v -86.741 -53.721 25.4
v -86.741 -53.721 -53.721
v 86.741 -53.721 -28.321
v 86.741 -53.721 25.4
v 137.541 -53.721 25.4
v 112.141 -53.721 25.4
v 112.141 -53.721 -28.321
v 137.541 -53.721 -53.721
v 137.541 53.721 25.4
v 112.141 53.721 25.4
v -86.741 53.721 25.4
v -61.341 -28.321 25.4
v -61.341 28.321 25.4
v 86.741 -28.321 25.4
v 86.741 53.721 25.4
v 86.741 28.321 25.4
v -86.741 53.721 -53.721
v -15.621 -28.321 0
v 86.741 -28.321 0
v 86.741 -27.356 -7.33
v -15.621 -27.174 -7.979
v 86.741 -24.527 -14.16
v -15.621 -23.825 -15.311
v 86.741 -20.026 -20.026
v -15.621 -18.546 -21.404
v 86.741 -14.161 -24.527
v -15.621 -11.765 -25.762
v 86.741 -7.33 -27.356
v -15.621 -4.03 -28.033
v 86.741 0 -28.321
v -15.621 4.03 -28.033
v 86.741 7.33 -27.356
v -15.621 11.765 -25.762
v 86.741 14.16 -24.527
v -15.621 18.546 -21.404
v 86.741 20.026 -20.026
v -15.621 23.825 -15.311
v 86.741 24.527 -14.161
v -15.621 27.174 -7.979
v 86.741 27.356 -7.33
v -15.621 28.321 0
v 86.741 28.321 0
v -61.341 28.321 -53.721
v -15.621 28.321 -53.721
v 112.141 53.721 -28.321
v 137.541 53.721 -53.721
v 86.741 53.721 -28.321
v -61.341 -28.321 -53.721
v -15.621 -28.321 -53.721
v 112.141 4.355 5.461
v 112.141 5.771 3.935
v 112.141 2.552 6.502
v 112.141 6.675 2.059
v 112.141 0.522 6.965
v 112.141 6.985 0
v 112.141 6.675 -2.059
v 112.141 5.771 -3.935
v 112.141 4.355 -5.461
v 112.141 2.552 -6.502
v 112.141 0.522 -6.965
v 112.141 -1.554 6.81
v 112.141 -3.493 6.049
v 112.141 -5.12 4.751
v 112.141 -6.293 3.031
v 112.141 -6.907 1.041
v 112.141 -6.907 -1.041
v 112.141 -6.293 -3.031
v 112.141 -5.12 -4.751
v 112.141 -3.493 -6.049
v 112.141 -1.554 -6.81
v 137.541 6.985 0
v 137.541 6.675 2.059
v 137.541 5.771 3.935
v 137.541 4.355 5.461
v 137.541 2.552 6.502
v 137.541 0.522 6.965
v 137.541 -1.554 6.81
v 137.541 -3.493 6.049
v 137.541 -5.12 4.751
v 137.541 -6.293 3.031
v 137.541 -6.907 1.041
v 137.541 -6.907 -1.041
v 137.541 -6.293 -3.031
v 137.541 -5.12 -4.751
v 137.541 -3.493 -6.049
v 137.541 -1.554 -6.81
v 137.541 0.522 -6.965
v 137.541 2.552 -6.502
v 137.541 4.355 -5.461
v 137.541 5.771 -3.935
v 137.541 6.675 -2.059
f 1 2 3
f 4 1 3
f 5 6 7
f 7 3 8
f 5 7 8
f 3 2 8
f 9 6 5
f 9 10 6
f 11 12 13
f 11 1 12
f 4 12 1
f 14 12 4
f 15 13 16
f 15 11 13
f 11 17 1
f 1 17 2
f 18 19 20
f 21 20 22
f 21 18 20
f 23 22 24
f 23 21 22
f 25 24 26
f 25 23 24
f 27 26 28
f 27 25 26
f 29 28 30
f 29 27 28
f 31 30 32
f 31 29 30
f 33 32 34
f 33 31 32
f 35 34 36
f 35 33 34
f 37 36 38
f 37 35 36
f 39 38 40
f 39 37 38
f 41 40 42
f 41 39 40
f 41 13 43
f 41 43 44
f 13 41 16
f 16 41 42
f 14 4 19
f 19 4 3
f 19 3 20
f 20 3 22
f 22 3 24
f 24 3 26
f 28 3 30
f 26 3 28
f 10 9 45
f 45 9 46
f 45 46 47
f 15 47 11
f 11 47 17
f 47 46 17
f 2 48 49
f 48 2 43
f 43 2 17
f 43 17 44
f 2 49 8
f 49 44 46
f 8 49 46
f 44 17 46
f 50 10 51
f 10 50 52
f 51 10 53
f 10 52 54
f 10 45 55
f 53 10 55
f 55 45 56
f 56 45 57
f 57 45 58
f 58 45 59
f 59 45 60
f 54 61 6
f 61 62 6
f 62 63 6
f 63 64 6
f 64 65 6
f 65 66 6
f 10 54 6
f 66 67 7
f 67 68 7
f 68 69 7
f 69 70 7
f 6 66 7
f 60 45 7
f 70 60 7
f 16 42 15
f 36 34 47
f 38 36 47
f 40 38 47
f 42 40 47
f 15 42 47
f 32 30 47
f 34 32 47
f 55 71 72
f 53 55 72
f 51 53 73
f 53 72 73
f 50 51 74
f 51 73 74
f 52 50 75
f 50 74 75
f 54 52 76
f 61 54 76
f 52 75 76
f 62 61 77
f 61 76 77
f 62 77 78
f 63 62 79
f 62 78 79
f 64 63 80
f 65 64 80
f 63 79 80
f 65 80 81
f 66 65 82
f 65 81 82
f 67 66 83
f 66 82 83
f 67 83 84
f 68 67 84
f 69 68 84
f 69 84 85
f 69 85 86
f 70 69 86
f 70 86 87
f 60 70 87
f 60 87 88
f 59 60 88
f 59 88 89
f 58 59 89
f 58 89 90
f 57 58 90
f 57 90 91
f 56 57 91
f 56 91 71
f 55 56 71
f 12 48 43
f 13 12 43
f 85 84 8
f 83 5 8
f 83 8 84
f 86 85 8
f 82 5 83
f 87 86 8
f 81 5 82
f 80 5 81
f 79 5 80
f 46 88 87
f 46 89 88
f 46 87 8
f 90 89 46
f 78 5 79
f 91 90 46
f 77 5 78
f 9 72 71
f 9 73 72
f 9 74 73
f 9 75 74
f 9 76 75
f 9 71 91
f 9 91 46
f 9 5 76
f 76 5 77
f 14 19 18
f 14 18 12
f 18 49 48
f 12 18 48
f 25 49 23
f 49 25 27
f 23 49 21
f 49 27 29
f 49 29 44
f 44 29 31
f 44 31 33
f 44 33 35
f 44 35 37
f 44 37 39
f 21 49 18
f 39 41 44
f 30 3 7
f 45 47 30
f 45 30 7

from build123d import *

# Parameters (mm, degrees)
F0_W     = 76.962
F0_H     = 28.321
F0_W_2   = 45.72
F0_W_3   = 25.4
F0_H_2   = 25.4
F1_DEPTH = 53.721
F3_DEPTH = 25.4
F4_DEPTH = 53.721
F5_R     = 6.985
F6_DEPTH = 25.4
F7_DEPTH = 28.321


with BuildPart() as f1:
    # F0 (on Top) → F1 (new body)
    with BuildSketch(Plane.XY):
        Polygon((86.741, -28.321), (61.341, -28.321), (-15.621, -28.321), (-61.341, -28.321), (-61.341, 0), (-61.341, 28.321), (-15.621, 28.321), (61.341, 28.321), (86.741, 28.321), (86.741, 53.721), (-86.741, 53.721), (-86.741, -53.721), (86.741, -53.721), align=None)
        with Locations((22.86, -14.1605)):
            Rectangle(F0_W, F0_H)
        with Locations((-38.481, -14.1605)):
            Rectangle(F0_W_2, F0_H)
        with Locations((74.041, -14.1605)):
            Rectangle(F0_W_3, F0_H)
        with Locations((74.041, 14.1605)):
            Rectangle(F0_W_3, F0_H)
        with Locations((22.86, 14.1605)):
            Rectangle(F0_W, F0_H)
        with Locations((-38.481, 14.1605)):
            Rectangle(F0_W_2, F0_H)
        Polygon((112.141, 0), (112.141, -28.321), (112.141, -53.721), (137.541, -53.721), (137.541, 53.721), (112.141, 53.721), (112.141, 28.321), align=None)
        with Locations((99.441, 41.021)):
            Rectangle(F0_W_3, F0_H_2)
        with Locations((99.441, -41.021)):
            Rectangle(F0_W_3, F0_H_2)
        with Locations((99.441, -14.1605)):
            Rectangle(F0_W_3, F0_H)
        with Locations((99.441, 14.1605)):
            Rectangle(F0_W_3, F0_H)
    extrude(amount=-F1_DEPTH)

    # F0 (on Top) → F2 (revolve, cut)
    with BuildSketch(Plane.XY):
        with Locations((74.041, 14.1605)):
            Rectangle(F0_W_3, F0_H)
        with Locations((-38.481, 14.1605)):
            Rectangle(F0_W_2, F0_H)
        with Locations((22.86, 14.1605)):
            Rectangle(F0_W, F0_H)
    revolve(axis=Axis((0, 0, 0), (1, 0, 0)), mode=Mode.SUBTRACT)

    # F0 (on Top) → F3 (join)
    with BuildSketch(Plane.XY):
        Polygon((86.741, -28.321), (61.341, -28.321), (-15.621, -28.321), (-61.341, -28.321), (-61.341, 0), (-61.341, 28.321), (-15.621, 28.321), (61.341, 28.321), (86.741, 28.321), (86.741, 53.721), (-86.741, 53.721), (-86.741, -53.721), (86.741, -53.721), align=None)
        Polygon((112.141, 0), (112.141, -28.321), (112.141, -53.721), (137.541, -53.721), (137.541, 53.721), (112.141, 53.721), (112.141, 28.321), align=None)
    extrude(amount=F3_DEPTH)

    # F0 (on Top) → F4 (cut)
    with BuildSketch(Plane.XY):
        with Locations((-38.481, 14.1605)):
            Rectangle(F0_W_2, F0_H)
        with Locations((-38.481, -14.1605)):
            Rectangle(F0_W_2, F0_H)
    extrude(amount=-F4_DEPTH, mode=Mode.SUBTRACT)

    # F5 (on face) → F6 (cut)
    with BuildSketch(Plane.YZ.offset(137.541)):
        Circle(F5_R)
    extrude(amount=-F6_DEPTH, mode=Mode.SUBTRACT)

    # F0 (on Top) → F7 (cut)
    with BuildSketch(Plane.XY):
        with Locations((99.441, 41.021)):
            Rectangle(F0_W_3, F0_H_2)
        with Locations((99.441, 14.1605)):
            Rectangle(F0_W_3, F0_H)
        with Locations((99.441, -14.1605)):
            Rectangle(F0_W_3, F0_H)
        with Locations((99.441, -41.021)):
            Rectangle(F0_W_3, F0_H_2)
    extrude(amount=-F7_DEPTH, mode=Mode.SUBTRACT)


solid = f1.part
